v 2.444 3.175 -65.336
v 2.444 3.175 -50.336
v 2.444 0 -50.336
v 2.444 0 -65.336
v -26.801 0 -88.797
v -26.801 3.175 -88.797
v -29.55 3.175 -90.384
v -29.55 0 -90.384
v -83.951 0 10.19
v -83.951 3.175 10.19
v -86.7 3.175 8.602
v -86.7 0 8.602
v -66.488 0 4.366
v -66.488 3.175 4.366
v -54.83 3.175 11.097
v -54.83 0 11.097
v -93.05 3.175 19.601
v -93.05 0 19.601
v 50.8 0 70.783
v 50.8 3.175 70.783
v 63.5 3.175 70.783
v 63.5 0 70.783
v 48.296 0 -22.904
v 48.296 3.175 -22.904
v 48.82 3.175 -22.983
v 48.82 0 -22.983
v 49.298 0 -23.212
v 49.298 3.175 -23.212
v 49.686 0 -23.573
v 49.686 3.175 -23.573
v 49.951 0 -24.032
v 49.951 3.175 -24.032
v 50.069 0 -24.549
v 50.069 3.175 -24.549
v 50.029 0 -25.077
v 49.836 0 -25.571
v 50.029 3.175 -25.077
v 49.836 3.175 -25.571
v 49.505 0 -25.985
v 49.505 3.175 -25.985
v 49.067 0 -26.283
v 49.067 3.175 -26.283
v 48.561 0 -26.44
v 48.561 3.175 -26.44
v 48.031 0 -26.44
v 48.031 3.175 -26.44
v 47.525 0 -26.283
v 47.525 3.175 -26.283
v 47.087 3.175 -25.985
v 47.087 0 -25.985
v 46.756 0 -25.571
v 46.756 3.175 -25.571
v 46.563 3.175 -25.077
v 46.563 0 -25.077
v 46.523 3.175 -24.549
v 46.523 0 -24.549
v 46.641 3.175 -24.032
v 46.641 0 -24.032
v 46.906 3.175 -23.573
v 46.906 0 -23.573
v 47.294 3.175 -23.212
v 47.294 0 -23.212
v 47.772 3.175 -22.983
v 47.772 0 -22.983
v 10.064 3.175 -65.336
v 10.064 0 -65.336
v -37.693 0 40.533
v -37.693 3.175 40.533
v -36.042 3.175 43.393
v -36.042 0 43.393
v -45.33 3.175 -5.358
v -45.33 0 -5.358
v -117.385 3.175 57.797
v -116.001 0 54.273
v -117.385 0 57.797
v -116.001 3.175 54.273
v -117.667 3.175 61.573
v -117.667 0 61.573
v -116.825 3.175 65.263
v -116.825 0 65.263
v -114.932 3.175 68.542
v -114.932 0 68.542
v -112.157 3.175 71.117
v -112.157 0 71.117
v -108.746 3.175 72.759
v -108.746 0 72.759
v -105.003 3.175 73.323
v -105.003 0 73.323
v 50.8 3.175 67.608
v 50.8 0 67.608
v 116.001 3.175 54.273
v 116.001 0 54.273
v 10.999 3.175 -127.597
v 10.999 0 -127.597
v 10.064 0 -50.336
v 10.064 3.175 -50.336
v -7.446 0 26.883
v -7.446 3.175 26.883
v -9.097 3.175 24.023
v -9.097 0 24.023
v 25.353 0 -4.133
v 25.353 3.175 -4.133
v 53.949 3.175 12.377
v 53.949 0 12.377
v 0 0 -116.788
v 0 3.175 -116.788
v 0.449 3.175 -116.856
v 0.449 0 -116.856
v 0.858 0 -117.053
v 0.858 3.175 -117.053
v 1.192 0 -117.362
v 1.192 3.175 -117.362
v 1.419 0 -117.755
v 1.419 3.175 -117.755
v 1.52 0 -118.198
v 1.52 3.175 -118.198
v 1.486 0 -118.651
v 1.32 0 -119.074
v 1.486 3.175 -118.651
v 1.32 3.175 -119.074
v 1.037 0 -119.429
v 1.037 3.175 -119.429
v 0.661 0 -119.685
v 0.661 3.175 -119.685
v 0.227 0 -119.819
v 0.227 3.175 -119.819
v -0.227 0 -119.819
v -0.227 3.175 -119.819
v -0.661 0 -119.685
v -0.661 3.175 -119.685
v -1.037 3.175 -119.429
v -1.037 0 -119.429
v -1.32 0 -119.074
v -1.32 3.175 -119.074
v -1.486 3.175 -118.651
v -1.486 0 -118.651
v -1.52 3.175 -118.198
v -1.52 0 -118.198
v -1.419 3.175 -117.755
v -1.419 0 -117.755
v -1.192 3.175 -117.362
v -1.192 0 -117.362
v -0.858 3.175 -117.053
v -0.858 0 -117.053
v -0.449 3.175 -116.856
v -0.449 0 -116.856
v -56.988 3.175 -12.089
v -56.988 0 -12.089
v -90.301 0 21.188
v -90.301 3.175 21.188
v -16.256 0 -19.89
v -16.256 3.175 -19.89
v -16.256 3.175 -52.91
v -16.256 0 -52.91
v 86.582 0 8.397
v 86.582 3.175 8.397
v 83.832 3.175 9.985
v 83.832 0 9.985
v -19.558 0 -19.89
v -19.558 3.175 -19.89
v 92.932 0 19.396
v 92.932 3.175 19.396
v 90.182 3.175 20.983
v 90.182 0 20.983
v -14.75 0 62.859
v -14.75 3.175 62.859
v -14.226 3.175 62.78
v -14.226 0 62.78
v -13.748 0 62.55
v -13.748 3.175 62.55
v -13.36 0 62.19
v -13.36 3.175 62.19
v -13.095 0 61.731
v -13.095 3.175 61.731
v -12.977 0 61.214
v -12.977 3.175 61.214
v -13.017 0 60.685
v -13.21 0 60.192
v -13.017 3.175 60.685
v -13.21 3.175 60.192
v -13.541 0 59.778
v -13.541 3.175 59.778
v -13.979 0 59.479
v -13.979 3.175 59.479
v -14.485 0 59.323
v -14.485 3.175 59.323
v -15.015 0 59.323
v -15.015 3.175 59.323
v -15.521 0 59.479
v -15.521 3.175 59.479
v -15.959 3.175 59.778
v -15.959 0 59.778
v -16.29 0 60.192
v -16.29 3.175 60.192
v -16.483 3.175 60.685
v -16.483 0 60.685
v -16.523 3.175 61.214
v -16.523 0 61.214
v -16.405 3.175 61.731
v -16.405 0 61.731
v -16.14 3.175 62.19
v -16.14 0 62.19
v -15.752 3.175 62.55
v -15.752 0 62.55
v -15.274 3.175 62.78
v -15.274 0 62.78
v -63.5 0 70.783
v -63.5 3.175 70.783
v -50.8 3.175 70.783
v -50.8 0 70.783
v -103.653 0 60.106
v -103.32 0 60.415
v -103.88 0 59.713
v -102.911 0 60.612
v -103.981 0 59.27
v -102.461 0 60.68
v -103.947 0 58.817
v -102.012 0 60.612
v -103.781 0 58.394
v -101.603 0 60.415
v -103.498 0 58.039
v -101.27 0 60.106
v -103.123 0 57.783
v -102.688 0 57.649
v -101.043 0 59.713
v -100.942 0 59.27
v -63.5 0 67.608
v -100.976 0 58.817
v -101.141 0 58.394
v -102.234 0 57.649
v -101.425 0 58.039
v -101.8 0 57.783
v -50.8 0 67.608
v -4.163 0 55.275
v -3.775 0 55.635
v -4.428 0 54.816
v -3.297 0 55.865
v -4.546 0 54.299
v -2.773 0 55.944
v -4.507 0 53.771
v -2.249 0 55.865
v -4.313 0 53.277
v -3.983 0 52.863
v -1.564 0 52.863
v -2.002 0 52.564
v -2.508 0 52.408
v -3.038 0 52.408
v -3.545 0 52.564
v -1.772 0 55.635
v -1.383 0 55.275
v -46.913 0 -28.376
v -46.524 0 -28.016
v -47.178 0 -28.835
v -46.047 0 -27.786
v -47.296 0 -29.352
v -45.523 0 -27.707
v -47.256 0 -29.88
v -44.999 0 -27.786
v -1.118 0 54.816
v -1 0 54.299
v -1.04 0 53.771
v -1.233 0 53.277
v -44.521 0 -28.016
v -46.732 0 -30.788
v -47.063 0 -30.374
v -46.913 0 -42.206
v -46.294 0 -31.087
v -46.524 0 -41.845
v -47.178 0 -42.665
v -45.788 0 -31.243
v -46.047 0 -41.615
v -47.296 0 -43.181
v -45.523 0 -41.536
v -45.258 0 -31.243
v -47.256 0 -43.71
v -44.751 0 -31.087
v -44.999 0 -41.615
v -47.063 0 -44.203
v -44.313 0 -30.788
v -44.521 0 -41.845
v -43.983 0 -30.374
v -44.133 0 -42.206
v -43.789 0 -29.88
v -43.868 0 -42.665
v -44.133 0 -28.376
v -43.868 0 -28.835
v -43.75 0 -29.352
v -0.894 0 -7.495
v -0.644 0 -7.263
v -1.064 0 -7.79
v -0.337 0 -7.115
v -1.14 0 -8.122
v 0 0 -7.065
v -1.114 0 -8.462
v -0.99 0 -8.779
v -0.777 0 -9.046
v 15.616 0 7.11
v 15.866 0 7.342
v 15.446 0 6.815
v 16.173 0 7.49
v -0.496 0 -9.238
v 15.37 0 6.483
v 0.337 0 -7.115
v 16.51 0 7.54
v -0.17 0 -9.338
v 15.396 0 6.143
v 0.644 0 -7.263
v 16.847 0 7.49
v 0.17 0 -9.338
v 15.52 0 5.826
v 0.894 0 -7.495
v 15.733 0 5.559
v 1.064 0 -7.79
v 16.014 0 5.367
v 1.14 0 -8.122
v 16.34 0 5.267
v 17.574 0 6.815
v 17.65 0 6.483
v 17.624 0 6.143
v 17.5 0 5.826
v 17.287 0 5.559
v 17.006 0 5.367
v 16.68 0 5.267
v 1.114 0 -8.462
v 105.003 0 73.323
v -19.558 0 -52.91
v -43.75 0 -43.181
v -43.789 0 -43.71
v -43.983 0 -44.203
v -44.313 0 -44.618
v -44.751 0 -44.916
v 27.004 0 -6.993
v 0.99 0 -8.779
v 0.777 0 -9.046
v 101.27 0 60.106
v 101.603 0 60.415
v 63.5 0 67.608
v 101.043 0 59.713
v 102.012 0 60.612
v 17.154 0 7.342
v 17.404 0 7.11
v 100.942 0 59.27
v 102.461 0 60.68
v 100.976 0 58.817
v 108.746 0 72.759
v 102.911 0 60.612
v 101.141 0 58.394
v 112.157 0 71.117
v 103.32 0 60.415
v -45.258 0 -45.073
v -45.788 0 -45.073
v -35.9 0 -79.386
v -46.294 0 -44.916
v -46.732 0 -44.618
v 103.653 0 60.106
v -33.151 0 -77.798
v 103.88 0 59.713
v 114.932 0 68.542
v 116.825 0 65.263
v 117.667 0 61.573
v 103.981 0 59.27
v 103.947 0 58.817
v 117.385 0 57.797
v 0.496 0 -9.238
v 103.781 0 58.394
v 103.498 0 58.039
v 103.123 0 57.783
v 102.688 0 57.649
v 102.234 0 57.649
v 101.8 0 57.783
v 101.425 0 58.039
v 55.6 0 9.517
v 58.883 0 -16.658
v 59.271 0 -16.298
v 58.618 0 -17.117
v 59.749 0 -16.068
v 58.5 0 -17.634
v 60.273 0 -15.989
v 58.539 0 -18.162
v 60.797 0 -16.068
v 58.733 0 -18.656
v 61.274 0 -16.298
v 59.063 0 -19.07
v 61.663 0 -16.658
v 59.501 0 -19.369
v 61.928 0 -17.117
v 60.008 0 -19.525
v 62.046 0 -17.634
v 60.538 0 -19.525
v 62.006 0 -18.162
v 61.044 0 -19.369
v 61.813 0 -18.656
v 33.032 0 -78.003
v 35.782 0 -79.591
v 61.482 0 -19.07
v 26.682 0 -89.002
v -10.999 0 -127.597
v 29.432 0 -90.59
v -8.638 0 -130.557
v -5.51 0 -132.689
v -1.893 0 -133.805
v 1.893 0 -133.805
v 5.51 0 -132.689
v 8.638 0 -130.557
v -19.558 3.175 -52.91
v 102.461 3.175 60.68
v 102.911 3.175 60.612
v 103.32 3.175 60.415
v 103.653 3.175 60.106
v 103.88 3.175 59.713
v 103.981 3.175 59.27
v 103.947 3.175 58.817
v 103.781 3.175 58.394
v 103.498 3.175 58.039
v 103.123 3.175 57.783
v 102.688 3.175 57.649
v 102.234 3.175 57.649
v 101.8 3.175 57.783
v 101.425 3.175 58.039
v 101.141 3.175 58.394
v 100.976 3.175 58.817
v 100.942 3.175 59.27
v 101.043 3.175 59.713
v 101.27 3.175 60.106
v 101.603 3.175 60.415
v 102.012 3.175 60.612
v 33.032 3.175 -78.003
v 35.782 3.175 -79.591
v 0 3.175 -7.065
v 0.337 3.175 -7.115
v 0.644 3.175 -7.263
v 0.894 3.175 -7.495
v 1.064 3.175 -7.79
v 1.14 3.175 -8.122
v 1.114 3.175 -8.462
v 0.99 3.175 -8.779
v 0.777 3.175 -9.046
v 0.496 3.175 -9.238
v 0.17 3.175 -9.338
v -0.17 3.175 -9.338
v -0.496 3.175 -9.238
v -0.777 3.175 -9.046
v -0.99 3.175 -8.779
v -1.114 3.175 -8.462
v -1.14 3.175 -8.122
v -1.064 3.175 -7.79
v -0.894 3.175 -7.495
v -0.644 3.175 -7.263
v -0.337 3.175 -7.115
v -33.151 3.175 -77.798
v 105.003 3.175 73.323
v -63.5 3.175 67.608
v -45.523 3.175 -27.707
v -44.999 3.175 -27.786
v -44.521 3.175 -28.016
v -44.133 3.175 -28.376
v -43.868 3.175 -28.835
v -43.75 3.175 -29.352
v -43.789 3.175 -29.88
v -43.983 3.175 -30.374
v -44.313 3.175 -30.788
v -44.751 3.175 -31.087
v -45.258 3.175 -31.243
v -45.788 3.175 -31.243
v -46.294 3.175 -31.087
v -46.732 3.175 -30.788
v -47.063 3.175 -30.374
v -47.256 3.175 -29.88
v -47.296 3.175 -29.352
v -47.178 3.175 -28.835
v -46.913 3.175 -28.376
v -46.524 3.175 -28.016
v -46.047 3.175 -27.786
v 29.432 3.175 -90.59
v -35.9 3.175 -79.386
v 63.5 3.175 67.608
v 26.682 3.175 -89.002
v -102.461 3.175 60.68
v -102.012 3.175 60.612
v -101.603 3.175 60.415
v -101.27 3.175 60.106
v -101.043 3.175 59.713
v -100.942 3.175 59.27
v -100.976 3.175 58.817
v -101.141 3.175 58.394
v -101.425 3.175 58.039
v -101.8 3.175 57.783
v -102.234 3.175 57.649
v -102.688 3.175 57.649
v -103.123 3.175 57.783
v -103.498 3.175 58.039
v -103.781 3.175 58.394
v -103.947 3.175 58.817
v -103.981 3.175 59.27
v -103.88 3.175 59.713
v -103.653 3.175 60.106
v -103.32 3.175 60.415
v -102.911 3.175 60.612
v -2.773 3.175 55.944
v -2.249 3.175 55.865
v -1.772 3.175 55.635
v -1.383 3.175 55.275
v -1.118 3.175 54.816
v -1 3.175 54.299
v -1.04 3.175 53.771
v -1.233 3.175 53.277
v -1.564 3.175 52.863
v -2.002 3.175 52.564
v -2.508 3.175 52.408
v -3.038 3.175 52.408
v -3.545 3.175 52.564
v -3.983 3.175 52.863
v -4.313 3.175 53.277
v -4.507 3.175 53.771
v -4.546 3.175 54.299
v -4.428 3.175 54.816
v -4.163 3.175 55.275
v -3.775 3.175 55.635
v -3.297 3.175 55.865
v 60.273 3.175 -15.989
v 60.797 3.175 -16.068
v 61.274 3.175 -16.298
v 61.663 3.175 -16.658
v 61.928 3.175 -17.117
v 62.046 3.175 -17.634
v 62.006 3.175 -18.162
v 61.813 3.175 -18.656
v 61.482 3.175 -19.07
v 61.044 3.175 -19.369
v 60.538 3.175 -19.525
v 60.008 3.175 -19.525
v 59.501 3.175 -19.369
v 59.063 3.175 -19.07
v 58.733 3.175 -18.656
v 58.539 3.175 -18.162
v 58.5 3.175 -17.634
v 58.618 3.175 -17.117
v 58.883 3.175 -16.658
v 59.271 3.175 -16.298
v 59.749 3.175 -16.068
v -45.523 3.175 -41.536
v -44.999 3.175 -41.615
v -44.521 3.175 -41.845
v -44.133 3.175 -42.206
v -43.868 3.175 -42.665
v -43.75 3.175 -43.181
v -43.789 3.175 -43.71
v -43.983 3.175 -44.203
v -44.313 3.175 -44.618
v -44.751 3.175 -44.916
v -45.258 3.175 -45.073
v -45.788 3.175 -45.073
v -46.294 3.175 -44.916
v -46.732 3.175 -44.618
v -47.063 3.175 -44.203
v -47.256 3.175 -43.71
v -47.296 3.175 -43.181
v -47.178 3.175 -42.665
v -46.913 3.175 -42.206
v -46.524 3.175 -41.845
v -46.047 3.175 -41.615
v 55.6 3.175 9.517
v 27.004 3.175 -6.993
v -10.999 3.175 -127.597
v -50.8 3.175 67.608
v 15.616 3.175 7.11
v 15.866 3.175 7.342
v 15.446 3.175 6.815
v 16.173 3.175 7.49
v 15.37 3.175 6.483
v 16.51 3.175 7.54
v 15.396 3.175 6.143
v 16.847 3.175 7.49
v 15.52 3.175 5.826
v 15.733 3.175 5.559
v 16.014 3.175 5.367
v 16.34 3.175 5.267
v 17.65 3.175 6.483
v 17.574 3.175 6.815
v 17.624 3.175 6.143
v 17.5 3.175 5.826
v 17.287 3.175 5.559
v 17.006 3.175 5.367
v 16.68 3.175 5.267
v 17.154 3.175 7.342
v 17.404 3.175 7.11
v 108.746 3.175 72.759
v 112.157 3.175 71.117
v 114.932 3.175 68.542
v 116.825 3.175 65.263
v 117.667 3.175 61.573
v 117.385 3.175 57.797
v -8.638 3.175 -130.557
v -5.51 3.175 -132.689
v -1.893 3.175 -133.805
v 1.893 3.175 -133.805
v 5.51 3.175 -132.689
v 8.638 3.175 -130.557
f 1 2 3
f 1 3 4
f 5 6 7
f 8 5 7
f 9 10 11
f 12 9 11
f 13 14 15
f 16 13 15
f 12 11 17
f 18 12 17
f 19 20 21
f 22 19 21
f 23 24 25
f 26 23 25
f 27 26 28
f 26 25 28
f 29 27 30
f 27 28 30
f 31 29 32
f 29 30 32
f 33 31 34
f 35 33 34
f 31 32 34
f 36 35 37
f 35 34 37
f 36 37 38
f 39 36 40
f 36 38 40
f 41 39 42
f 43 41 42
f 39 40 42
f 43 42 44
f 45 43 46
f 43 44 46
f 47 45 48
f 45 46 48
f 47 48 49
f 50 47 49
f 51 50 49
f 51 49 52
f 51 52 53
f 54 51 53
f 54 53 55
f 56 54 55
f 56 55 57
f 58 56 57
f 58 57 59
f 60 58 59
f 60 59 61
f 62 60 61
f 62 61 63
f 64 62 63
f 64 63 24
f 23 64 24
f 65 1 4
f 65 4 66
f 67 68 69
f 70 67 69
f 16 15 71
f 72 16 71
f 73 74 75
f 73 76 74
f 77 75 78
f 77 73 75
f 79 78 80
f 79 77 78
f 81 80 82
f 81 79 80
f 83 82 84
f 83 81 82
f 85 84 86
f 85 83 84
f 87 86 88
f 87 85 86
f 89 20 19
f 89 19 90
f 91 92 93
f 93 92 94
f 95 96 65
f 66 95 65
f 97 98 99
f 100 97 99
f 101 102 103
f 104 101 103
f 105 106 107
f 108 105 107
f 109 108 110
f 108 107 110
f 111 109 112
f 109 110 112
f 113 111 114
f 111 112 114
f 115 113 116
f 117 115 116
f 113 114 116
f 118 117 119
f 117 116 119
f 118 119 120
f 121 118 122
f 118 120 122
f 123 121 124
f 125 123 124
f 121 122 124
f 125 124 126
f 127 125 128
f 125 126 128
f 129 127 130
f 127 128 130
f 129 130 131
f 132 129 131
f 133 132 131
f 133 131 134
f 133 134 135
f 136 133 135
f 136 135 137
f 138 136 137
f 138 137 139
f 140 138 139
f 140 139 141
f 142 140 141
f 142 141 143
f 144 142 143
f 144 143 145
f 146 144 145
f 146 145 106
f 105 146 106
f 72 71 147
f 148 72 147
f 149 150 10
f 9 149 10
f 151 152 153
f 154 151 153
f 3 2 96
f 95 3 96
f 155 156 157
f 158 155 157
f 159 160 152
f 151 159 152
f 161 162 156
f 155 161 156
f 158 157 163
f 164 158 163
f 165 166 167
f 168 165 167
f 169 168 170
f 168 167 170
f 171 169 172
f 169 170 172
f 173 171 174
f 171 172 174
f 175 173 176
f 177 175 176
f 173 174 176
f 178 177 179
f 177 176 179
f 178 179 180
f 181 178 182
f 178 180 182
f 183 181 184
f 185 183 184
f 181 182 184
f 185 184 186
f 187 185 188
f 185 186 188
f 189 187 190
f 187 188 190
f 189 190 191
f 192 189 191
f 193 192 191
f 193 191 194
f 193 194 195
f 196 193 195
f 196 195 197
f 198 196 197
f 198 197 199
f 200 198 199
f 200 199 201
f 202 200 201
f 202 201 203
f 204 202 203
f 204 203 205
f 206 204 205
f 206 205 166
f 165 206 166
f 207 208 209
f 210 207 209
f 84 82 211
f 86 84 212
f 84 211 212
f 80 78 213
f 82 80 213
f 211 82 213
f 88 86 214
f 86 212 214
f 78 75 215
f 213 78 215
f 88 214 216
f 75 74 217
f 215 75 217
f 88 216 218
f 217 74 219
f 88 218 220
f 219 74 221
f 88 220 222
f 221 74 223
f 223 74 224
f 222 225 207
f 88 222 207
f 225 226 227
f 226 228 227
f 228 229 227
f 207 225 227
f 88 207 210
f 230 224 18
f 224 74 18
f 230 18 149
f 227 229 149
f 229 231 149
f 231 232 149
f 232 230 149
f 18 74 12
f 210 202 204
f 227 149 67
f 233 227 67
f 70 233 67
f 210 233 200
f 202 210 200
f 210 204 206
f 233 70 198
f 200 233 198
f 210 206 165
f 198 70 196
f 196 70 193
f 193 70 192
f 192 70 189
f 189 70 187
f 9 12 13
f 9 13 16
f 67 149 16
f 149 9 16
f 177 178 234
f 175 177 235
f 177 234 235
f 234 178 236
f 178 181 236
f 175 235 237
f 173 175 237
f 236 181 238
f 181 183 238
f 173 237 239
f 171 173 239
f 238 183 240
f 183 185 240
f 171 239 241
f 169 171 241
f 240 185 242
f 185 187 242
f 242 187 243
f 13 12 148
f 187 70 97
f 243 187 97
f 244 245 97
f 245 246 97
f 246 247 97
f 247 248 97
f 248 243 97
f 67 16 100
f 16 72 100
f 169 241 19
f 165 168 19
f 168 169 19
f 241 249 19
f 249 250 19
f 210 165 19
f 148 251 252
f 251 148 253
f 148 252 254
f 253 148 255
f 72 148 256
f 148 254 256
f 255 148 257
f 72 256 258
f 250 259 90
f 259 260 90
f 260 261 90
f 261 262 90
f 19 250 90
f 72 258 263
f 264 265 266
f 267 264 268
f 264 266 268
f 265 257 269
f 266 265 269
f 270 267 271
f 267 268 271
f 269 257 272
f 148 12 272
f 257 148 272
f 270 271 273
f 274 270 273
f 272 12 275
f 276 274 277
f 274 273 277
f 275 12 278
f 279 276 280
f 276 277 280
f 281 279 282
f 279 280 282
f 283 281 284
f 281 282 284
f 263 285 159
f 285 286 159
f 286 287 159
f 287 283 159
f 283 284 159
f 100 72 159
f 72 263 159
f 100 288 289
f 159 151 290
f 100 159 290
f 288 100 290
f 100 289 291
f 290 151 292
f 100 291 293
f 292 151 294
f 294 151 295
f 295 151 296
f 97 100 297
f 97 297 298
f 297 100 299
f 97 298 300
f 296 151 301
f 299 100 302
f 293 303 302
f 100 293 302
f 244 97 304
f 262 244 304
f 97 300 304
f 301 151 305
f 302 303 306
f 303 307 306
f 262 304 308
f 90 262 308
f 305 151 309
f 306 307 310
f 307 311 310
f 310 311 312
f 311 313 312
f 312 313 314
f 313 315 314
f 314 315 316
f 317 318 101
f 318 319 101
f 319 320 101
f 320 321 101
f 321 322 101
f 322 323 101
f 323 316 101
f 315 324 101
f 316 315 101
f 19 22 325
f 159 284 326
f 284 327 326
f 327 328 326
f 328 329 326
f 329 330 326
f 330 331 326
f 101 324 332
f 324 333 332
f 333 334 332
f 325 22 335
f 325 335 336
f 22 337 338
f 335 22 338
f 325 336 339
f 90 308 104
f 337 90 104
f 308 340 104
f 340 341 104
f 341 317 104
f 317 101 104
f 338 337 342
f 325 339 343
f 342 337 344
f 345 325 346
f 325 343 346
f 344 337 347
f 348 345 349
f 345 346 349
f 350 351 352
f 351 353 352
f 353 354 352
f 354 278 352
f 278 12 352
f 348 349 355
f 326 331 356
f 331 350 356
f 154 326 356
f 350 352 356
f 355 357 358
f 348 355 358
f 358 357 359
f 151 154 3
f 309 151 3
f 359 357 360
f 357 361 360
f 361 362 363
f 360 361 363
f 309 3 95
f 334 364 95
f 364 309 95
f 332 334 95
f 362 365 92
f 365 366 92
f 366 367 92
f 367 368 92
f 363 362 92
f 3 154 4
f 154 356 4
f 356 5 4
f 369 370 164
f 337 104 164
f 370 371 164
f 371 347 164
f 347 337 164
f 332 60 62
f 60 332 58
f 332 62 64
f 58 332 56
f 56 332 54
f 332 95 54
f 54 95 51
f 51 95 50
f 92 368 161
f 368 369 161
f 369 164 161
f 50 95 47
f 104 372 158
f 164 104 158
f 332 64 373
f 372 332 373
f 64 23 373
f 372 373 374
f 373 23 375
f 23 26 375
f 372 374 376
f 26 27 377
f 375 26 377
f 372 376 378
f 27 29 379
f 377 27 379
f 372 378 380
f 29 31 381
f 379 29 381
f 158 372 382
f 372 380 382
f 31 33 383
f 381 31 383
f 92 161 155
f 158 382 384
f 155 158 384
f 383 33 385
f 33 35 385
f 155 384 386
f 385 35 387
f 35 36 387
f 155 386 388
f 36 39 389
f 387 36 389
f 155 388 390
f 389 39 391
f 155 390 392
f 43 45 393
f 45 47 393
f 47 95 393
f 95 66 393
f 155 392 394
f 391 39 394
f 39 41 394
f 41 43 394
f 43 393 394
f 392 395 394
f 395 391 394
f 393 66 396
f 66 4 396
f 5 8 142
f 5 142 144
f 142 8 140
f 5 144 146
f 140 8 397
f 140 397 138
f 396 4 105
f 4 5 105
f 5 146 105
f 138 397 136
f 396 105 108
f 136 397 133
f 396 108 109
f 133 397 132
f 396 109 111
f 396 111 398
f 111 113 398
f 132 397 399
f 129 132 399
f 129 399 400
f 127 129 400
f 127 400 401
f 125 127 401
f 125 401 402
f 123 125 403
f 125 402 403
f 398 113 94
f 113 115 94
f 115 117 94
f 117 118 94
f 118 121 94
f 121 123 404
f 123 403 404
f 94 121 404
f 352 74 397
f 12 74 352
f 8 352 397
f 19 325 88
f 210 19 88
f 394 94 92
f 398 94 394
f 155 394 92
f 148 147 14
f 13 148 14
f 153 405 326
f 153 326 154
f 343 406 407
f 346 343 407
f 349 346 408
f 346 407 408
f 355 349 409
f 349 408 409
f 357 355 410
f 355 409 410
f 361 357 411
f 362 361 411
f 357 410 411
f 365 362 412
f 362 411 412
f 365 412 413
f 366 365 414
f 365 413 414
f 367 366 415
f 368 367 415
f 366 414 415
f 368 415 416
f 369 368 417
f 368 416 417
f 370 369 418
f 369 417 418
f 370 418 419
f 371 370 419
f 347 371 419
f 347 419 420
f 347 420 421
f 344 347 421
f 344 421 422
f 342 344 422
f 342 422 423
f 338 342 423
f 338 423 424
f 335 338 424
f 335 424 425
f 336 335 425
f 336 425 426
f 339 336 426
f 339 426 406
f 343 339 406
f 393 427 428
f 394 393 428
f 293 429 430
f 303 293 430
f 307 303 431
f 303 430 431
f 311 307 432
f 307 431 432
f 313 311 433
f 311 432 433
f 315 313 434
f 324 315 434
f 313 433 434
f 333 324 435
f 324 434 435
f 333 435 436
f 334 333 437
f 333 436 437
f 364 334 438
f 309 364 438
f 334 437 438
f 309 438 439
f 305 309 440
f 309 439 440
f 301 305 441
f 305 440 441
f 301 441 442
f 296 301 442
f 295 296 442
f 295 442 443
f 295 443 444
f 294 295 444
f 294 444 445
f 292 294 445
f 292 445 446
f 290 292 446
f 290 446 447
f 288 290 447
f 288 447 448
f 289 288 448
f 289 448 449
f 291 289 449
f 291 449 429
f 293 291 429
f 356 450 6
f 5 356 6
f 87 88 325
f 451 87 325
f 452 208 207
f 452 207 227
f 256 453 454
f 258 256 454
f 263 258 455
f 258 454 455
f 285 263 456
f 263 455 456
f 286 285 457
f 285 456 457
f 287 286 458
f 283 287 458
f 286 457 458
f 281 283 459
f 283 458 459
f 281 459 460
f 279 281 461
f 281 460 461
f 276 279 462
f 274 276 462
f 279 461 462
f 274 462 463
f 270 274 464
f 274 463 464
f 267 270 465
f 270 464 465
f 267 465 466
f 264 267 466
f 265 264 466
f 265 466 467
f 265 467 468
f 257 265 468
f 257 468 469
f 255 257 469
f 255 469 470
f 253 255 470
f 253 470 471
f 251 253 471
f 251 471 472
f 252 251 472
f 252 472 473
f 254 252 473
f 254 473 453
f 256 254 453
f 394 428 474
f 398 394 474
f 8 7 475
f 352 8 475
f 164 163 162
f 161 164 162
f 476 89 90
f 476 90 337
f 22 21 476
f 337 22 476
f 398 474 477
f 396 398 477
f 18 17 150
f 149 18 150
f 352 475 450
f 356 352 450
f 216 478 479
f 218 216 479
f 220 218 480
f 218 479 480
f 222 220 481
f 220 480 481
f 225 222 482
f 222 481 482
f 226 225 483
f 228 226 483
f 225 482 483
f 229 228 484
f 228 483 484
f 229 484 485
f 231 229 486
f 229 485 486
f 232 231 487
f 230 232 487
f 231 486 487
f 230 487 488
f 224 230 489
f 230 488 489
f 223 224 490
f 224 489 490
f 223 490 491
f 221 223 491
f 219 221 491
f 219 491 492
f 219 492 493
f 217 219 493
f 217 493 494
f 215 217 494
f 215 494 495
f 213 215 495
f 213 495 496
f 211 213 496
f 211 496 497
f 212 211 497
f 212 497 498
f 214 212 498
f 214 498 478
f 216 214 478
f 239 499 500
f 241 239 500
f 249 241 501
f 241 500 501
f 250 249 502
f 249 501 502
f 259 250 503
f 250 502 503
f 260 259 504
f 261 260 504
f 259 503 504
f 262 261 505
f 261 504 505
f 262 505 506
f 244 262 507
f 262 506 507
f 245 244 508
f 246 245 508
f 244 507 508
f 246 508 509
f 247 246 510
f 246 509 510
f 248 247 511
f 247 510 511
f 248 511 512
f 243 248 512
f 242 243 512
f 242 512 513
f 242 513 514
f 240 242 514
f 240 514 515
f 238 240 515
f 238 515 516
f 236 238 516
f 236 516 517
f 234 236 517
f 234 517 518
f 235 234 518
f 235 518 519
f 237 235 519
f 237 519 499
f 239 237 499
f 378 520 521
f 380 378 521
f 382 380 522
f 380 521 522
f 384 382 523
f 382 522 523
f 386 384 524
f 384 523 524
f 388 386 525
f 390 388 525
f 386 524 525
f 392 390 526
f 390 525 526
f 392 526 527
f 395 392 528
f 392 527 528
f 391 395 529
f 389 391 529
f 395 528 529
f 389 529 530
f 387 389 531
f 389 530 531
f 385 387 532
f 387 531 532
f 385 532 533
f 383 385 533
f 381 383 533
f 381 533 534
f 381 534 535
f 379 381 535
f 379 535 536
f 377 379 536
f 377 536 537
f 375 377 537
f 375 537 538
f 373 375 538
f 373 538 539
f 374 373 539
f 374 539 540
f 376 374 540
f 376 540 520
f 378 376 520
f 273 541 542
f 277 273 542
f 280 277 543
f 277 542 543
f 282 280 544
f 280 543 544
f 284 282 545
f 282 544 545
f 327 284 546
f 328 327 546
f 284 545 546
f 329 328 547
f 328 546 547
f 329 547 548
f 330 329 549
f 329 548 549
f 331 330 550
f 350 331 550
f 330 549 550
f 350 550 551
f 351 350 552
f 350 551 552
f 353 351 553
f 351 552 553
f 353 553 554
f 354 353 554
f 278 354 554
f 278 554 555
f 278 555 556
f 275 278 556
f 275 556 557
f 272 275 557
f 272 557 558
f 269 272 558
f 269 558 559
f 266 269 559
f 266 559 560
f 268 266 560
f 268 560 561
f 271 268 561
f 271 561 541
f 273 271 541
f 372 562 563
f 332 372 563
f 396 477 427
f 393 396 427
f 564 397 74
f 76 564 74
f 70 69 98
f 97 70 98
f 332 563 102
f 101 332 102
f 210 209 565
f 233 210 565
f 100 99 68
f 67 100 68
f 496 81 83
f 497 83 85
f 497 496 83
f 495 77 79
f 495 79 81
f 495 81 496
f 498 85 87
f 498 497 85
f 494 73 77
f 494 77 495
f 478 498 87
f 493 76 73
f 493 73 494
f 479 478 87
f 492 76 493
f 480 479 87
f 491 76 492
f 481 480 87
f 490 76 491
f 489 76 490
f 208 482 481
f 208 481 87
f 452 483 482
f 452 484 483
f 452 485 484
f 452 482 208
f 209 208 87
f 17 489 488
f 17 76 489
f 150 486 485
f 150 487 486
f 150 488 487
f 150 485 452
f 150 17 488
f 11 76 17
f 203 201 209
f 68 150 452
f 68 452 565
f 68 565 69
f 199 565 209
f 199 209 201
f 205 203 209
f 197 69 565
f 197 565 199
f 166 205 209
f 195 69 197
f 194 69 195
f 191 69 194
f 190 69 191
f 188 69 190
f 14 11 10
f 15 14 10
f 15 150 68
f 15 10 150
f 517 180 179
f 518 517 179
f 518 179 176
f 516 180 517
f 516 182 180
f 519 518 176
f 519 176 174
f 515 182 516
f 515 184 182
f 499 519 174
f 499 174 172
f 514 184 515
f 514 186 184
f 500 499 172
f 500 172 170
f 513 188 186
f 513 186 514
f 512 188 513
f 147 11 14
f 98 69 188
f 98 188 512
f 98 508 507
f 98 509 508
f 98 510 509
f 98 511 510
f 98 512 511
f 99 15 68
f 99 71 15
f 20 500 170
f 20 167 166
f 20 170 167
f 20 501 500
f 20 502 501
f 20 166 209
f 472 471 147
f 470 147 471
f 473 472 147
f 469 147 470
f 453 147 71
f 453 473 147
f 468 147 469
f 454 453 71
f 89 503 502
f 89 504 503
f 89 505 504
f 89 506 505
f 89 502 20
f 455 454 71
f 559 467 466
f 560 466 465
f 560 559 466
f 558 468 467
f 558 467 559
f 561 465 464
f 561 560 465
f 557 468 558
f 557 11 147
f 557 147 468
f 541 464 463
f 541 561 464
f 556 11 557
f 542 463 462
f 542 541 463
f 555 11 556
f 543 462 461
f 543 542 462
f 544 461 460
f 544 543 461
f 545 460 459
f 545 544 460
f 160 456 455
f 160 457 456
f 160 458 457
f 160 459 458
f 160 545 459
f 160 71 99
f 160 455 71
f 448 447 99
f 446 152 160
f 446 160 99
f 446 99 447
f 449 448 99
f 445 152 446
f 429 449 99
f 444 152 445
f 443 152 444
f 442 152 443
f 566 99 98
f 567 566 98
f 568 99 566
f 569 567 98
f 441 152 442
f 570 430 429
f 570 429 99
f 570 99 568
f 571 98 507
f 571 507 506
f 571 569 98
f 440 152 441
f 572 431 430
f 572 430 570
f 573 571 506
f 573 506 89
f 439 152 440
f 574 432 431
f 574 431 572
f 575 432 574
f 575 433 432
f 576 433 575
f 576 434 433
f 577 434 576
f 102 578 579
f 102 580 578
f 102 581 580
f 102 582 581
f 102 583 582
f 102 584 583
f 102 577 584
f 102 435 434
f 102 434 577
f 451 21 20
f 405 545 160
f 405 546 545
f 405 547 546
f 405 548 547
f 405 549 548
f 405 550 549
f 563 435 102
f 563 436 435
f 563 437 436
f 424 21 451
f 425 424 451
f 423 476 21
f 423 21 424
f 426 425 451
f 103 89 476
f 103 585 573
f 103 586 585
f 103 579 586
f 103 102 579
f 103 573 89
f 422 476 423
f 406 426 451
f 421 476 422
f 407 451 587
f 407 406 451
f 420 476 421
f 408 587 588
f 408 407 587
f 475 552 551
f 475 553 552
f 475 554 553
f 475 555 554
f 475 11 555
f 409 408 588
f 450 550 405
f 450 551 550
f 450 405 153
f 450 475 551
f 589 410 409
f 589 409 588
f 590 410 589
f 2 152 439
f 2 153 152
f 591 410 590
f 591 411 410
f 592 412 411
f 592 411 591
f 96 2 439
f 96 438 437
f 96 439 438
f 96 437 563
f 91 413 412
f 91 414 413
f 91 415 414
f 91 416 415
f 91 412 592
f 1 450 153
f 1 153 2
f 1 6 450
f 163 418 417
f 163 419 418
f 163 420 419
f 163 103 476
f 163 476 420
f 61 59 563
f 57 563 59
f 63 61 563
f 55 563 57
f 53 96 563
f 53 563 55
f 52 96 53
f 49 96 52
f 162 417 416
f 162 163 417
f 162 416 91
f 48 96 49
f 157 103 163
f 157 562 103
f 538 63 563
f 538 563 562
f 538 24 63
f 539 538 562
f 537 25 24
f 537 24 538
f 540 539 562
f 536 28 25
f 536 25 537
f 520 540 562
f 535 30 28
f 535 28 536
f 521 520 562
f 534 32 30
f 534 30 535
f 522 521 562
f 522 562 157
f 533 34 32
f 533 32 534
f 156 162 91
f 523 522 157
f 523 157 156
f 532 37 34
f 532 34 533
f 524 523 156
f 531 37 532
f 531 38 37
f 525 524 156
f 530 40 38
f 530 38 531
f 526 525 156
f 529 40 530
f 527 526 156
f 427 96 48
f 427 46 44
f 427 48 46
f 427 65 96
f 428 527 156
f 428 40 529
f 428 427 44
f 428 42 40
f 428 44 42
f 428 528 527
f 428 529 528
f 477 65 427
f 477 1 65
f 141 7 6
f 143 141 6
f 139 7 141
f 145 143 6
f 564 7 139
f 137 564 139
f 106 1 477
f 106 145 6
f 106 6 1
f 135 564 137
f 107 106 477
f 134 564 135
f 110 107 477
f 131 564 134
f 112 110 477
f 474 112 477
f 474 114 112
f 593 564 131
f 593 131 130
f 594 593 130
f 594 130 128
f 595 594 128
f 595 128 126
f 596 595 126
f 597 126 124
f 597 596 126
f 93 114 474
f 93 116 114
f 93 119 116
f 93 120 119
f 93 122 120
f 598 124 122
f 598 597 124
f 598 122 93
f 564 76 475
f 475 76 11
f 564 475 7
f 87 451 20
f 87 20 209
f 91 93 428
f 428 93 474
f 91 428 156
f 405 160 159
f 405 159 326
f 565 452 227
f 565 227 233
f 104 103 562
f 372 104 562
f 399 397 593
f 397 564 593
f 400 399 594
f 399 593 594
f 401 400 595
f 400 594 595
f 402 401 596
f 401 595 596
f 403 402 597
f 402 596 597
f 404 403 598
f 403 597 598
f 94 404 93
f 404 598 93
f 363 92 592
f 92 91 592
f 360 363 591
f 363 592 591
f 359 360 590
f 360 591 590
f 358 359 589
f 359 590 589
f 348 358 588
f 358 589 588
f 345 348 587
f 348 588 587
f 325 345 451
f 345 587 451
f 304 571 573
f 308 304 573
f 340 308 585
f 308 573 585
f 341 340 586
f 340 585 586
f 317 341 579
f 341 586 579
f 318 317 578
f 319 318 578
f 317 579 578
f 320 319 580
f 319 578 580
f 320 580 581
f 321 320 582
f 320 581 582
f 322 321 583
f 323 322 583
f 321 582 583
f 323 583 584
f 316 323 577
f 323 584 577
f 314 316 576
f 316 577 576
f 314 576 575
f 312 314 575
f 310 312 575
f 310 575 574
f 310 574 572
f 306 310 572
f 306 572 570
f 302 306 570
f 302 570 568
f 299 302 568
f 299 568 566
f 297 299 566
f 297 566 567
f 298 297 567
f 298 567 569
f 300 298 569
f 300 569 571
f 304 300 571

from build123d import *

# Parameters (mm, degrees)
BOSS_EXTRUDE1_DEPTH = 3.175
SKETCH2_W           = 3.302
SKETCH2_H           = 33.02
SKETCH2_R           = 1.778
CUT_EXTRUDE1_DEPTH  = 195.021684248
SKETCH3_R           = 1.524
CUT_EXTRUDE2_DEPTH  = 195.021684248
SKETCH4_R           = 1.143
CUT_EXTRUDE3_DEPTH  = 195.021684248
FILLET1_R           = 12.7
SKETCH5_W           = 12.7
SKETCH5_H           = 3.175
CUT_EXTRUDE4_DEPTH  = 179.341965104
CUT_EXTRUDE5_DEPTH  = 179.341965104
SKETCH9_W           = 7.62
SKETCH9_H           = 15
CUT_EXTRUDE8_DEPTH  = 179.341965104


with BuildPart() as part:
    # Sketch1 → Boss-Extrude1 (new body)
    with BuildSketch(Plane(origin=(0, 0, 0), x_dir=(1, 0, 0), z_dir=(0, 1, 0))):
        Polygon((0, 146.646968374), (-127, -73.323484187), (127, -73.323484187), align=None)
    extrude(amount=BOSS_EXTRUDE1_DEPTH)

    # Sketch2 → Cut-Extrude1 (cut, through all)
    with BuildSketch(Plane(origin=(0, 3.175, 0), x_dir=(1, 0, 0), z_dir=(0, 1, 0))):
        with Locations((-17.907, 36.399572365)):
            Rectangle(SKETCH2_W, SKETCH2_H)
        with Locations(Location((-45.522797213, 43.314369578, 0), (0, 0, 270))):
            Circle(SKETCH2_R)
        with Locations(Location((-45.522797213, 29.484775151, 0), (0, 0, 270))):
            Circle(SKETCH2_R)
        with Locations(Location((-14.749945797, -61.081083627, 0), (0, 0, 270))):
            Circle(SKETCH2_R)
        with Locations(Location((-2.773165699, -54.166286414, 0), (0, 0, 270))):
            Circle(SKETCH2_R)
        Polygon((-7.445874938, -26.882511029), (-9.096874938, -24.022895146), (-37.693033771, -40.532895146), (-36.042033771, -43.392511029), align=None)
        Polygon((55.600033771, -9.517061335), (27.003874938, 6.992938665), (25.352874938, 4.133322782), (53.949033771, -12.376677218), align=None)
        with Locations(Location((48.295962913, 24.681511262, 0), (0, 0, 270))):
            Circle(SKETCH2_R)
        with Locations(Location((60.27274301, 17.766714049, 0), (0, 0, 270))):
            Circle(SKETCH2_R)
    extrude(amount=-CUT_EXTRUDE1_DEPTH, mode=Mode.SUBTRACT)

    # Sketch3 → Cut-Extrude2 (cut, through all)
    with BuildSketch(Plane(origin=(0, 3.175, 0), x_dir=(1, 0, 0), z_dir=(0, 1, 0))):
        with Locations(Location((0, 118.312139176, 0), (0, 0, 270))):
            Circle(SKETCH3_R)
        with Locations(Location((-102.461318102, -59.156069588, 0), (0, 0, 270))):
            Circle(SKETCH3_R)
        with Locations(Location((102.461318102, -59.156069588, 0), (0, 0, 270))):
            Circle(SKETCH3_R)
    extrude(amount=-CUT_EXTRUDE2_DEPTH, mode=Mode.SUBTRACT)

    # Sketch4 → Cut-Extrude3 (cut, through all)
    with BuildSketch(Plane(origin=(0, 3.175, 0), x_dir=(1, 0, 0), z_dir=(0, 1, 0))):
        with Locations(Location((0, 8.207705491, 0), (0, 0, 270))):
            Circle(SKETCH4_R)
        with Locations(Location((16.51, -6.397294509, 0), (0, 0, 270))):
            Circle(SKETCH4_R)
    extrude(amount=-CUT_EXTRUDE3_DEPTH, mode=Mode.SUBTRACT)

    # Fillet1
    fillet1_edges = [part.edges().sort_by_distance(p)[0] for p in [
        (127, 1.5875, 73.323484187),
        (-127, 1.5875, 73.323484187),
        (0, 1.5875, -146.646968374),
    ]]
    fillet(fillet1_edges, radius=FILLET1_R)

    # Sketch5 → Cut-Extrude4 (cut, through all)
    with BuildSketch(Plane(origin=(0, 3.175, 0), x_dir=(1, 0, 0), z_dir=(0, 1, 0))):
        with Locations((-57.15, -69.195984187)):
            Rectangle(SKETCH5_W, SKETCH5_H)
        with Locations((57.15, -69.195984187)):
            Rectangle(SKETCH5_W, SKETCH5_H)
        Polygon((92.931850743, -19.395718754), (86.581850743, -8.397196126), (83.832220086, -9.984696126), (90.182220086, -20.983218754), align=None)
        Polygon((33.032220086, 78.003484899), (35.781850743, 79.590984899), (29.431850743, 90.589507527), (26.682220086, 89.002007527), align=None)
        Polygon((-29.550295474, 90.384355234), (-35.900295474, 79.385832606), (-33.150664817, 77.798332606), (-26.800664817, 88.796855234), align=None)
        Polygon((-83.950664817, -10.189848419), (-86.700295474, -8.602348419), (-93.050295474, -19.600871047), (-90.300664817, -21.188371047), align=None)
    extrude(amount=-CUT_EXTRUDE4_DEPTH, mode=Mode.SUBTRACT)

    # Sketch6 → Cut-Extrude5 (cut, through all)
    with BuildSketch(Plane(origin=(0, 3.175, 0), x_dir=(1, 0, 0), z_dir=(0, 1, 0))):
        Polygon((-54.829873821, -11.096773597), (-45.329873821, 5.357709075), (-56.988307807, 12.088709075), (-66.488307807, -4.365773597), align=None)
    extrude(amount=-CUT_EXTRUDE5_DEPTH, mode=Mode.SUBTRACT)

    # Sketch9 → Cut-Extrude8 (cut, through all)
    with BuildSketch(Plane(origin=(0, 3.175, 0), x_dir=(1, 0, 0), z_dir=(0, 1, 0))):
        with Locations((6.254067487, 57.836284876)):
            Rectangle(SKETCH9_W, SKETCH9_H)
    extrude(amount=-CUT_EXTRUDE8_DEPTH, mode=Mode.SUBTRACT)


solid = part.part
